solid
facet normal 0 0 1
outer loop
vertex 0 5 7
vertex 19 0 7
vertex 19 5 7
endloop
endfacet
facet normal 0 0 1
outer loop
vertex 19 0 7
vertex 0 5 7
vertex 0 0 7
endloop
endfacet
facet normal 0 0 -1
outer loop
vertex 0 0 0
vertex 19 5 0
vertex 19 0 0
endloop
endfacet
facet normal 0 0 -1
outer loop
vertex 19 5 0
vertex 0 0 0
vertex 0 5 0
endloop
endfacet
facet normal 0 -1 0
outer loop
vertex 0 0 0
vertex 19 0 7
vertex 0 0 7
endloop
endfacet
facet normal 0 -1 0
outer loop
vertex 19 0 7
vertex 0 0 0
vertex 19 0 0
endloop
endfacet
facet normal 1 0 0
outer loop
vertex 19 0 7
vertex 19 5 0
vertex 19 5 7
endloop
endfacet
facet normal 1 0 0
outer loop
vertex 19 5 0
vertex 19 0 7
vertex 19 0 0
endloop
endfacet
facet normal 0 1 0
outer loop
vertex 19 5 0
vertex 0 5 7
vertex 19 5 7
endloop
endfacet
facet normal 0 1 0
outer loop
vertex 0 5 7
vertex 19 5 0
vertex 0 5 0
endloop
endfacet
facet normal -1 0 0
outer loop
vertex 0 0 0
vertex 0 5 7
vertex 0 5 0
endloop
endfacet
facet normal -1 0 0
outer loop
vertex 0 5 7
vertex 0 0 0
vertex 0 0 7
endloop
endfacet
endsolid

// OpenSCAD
// Generated by SolidPython 1.0.1 on 2020-07-29 00:46:56


cube(size = [19, 5, 7]);
/***********************************************
*********      SolidPython code:      **********
************************************************
 
# import packages: SolidPython
from solid import *
from solid.utils import *
from itertools import chain, combinations, permutations


class Resize:

    def __init__(self, scad_file):
        self.scad_file = scad_file
        #self.scad_file = import_scad(scad_file)
        # cone/cylinder param:
        self.r1 = 0
        self.r2 = 0
        self.h = 0
        # rectangular prism param:
        self.w = 0
        self.l = 0
        # ellipse param:
        self.r = 0

    # import OpenScad code (file name corresponds to shape)


    # classify shape + parameters
    def assign(self, param1, param2, param3):
        if self.scad_file == 'cone.scad':
            self.r1 = param1
            self.r2 = param2
            self.h = param3
        elif self.scad_file == 'cylinder.scad':
            self.r1 = param1
            self.r2 = param2
            self.h = param3
        elif self.scad_file == 'rectangularPrism.scad':
            self.h = param1
            self.l = param2
            self.w = param3
        else:
            self.r = param1
            self.h = param2

    # resize parameters
    def iterate(self):
        x = range(3, 20, 2)
        i = 1
        if self.scad_file == 'cone.scad':
            tempList = list(permutations(x, 2))
            for temp in tempList:
                param1 = temp[0]
                param2 = temp[1]
                filepath = 'produced_scad_files/' + 'cone' + str(param1) + '_' + str(param2) + '_' + '.scad'
                scad_render_to_file(cylinder(h=param1, r1=param2, r2=0), filepath)

        elif self.scad_file == 'cylinder.scad':
            tempList = list(permutations(x, 3))
            for temp in tempList:
                param1 = temp[0]
                param2 = temp[1]
                filepath = 'produced_scad_files/' + 'cylinder' + str(param1) + '_' + str(param2) + '_' + '.scad'
                scad_render_to_file(cylinder(h=param1, r1=param2, r2=param2), filepath)

        elif self.scad_file == 'rectangularPrism.scad':
            tempList = list(permutations(x, 3))
            for temp in tempList:
                param1 = temp[0]
                param2 = temp[1]
                param3 = temp[2]
                filepath = 'produced_scad_files/' + 'rectangularPrism' + str(param1) + '_' + str(param2) + '_' + str(
                    param3) + '.scad'
                scad_render_to_file(cube(size=(param1, param2, param3)), filepath)

        elif self.scad_file == 'ellipse.scad':
            tempList = list(permutations(x, 4))
            for temp in tempList:
                param1 = temp[0]
                param2 = temp[1]
                param3 = temp[2]
                param4 = temp[3]
                filepath = 'produced_scad_files/' + 'ellipse' + str(param1) + '_' + str(param2) + '_' + str(param3) + '_' + str(param4) + '.scad'
                scad_render_to_file(scale([param1, param2, param3])(sphere(r=param4)), filepath)

    def render_to_scadfile(self):
        scad_render_to_file(scad, 'example.scad') 
 
************************************************/
